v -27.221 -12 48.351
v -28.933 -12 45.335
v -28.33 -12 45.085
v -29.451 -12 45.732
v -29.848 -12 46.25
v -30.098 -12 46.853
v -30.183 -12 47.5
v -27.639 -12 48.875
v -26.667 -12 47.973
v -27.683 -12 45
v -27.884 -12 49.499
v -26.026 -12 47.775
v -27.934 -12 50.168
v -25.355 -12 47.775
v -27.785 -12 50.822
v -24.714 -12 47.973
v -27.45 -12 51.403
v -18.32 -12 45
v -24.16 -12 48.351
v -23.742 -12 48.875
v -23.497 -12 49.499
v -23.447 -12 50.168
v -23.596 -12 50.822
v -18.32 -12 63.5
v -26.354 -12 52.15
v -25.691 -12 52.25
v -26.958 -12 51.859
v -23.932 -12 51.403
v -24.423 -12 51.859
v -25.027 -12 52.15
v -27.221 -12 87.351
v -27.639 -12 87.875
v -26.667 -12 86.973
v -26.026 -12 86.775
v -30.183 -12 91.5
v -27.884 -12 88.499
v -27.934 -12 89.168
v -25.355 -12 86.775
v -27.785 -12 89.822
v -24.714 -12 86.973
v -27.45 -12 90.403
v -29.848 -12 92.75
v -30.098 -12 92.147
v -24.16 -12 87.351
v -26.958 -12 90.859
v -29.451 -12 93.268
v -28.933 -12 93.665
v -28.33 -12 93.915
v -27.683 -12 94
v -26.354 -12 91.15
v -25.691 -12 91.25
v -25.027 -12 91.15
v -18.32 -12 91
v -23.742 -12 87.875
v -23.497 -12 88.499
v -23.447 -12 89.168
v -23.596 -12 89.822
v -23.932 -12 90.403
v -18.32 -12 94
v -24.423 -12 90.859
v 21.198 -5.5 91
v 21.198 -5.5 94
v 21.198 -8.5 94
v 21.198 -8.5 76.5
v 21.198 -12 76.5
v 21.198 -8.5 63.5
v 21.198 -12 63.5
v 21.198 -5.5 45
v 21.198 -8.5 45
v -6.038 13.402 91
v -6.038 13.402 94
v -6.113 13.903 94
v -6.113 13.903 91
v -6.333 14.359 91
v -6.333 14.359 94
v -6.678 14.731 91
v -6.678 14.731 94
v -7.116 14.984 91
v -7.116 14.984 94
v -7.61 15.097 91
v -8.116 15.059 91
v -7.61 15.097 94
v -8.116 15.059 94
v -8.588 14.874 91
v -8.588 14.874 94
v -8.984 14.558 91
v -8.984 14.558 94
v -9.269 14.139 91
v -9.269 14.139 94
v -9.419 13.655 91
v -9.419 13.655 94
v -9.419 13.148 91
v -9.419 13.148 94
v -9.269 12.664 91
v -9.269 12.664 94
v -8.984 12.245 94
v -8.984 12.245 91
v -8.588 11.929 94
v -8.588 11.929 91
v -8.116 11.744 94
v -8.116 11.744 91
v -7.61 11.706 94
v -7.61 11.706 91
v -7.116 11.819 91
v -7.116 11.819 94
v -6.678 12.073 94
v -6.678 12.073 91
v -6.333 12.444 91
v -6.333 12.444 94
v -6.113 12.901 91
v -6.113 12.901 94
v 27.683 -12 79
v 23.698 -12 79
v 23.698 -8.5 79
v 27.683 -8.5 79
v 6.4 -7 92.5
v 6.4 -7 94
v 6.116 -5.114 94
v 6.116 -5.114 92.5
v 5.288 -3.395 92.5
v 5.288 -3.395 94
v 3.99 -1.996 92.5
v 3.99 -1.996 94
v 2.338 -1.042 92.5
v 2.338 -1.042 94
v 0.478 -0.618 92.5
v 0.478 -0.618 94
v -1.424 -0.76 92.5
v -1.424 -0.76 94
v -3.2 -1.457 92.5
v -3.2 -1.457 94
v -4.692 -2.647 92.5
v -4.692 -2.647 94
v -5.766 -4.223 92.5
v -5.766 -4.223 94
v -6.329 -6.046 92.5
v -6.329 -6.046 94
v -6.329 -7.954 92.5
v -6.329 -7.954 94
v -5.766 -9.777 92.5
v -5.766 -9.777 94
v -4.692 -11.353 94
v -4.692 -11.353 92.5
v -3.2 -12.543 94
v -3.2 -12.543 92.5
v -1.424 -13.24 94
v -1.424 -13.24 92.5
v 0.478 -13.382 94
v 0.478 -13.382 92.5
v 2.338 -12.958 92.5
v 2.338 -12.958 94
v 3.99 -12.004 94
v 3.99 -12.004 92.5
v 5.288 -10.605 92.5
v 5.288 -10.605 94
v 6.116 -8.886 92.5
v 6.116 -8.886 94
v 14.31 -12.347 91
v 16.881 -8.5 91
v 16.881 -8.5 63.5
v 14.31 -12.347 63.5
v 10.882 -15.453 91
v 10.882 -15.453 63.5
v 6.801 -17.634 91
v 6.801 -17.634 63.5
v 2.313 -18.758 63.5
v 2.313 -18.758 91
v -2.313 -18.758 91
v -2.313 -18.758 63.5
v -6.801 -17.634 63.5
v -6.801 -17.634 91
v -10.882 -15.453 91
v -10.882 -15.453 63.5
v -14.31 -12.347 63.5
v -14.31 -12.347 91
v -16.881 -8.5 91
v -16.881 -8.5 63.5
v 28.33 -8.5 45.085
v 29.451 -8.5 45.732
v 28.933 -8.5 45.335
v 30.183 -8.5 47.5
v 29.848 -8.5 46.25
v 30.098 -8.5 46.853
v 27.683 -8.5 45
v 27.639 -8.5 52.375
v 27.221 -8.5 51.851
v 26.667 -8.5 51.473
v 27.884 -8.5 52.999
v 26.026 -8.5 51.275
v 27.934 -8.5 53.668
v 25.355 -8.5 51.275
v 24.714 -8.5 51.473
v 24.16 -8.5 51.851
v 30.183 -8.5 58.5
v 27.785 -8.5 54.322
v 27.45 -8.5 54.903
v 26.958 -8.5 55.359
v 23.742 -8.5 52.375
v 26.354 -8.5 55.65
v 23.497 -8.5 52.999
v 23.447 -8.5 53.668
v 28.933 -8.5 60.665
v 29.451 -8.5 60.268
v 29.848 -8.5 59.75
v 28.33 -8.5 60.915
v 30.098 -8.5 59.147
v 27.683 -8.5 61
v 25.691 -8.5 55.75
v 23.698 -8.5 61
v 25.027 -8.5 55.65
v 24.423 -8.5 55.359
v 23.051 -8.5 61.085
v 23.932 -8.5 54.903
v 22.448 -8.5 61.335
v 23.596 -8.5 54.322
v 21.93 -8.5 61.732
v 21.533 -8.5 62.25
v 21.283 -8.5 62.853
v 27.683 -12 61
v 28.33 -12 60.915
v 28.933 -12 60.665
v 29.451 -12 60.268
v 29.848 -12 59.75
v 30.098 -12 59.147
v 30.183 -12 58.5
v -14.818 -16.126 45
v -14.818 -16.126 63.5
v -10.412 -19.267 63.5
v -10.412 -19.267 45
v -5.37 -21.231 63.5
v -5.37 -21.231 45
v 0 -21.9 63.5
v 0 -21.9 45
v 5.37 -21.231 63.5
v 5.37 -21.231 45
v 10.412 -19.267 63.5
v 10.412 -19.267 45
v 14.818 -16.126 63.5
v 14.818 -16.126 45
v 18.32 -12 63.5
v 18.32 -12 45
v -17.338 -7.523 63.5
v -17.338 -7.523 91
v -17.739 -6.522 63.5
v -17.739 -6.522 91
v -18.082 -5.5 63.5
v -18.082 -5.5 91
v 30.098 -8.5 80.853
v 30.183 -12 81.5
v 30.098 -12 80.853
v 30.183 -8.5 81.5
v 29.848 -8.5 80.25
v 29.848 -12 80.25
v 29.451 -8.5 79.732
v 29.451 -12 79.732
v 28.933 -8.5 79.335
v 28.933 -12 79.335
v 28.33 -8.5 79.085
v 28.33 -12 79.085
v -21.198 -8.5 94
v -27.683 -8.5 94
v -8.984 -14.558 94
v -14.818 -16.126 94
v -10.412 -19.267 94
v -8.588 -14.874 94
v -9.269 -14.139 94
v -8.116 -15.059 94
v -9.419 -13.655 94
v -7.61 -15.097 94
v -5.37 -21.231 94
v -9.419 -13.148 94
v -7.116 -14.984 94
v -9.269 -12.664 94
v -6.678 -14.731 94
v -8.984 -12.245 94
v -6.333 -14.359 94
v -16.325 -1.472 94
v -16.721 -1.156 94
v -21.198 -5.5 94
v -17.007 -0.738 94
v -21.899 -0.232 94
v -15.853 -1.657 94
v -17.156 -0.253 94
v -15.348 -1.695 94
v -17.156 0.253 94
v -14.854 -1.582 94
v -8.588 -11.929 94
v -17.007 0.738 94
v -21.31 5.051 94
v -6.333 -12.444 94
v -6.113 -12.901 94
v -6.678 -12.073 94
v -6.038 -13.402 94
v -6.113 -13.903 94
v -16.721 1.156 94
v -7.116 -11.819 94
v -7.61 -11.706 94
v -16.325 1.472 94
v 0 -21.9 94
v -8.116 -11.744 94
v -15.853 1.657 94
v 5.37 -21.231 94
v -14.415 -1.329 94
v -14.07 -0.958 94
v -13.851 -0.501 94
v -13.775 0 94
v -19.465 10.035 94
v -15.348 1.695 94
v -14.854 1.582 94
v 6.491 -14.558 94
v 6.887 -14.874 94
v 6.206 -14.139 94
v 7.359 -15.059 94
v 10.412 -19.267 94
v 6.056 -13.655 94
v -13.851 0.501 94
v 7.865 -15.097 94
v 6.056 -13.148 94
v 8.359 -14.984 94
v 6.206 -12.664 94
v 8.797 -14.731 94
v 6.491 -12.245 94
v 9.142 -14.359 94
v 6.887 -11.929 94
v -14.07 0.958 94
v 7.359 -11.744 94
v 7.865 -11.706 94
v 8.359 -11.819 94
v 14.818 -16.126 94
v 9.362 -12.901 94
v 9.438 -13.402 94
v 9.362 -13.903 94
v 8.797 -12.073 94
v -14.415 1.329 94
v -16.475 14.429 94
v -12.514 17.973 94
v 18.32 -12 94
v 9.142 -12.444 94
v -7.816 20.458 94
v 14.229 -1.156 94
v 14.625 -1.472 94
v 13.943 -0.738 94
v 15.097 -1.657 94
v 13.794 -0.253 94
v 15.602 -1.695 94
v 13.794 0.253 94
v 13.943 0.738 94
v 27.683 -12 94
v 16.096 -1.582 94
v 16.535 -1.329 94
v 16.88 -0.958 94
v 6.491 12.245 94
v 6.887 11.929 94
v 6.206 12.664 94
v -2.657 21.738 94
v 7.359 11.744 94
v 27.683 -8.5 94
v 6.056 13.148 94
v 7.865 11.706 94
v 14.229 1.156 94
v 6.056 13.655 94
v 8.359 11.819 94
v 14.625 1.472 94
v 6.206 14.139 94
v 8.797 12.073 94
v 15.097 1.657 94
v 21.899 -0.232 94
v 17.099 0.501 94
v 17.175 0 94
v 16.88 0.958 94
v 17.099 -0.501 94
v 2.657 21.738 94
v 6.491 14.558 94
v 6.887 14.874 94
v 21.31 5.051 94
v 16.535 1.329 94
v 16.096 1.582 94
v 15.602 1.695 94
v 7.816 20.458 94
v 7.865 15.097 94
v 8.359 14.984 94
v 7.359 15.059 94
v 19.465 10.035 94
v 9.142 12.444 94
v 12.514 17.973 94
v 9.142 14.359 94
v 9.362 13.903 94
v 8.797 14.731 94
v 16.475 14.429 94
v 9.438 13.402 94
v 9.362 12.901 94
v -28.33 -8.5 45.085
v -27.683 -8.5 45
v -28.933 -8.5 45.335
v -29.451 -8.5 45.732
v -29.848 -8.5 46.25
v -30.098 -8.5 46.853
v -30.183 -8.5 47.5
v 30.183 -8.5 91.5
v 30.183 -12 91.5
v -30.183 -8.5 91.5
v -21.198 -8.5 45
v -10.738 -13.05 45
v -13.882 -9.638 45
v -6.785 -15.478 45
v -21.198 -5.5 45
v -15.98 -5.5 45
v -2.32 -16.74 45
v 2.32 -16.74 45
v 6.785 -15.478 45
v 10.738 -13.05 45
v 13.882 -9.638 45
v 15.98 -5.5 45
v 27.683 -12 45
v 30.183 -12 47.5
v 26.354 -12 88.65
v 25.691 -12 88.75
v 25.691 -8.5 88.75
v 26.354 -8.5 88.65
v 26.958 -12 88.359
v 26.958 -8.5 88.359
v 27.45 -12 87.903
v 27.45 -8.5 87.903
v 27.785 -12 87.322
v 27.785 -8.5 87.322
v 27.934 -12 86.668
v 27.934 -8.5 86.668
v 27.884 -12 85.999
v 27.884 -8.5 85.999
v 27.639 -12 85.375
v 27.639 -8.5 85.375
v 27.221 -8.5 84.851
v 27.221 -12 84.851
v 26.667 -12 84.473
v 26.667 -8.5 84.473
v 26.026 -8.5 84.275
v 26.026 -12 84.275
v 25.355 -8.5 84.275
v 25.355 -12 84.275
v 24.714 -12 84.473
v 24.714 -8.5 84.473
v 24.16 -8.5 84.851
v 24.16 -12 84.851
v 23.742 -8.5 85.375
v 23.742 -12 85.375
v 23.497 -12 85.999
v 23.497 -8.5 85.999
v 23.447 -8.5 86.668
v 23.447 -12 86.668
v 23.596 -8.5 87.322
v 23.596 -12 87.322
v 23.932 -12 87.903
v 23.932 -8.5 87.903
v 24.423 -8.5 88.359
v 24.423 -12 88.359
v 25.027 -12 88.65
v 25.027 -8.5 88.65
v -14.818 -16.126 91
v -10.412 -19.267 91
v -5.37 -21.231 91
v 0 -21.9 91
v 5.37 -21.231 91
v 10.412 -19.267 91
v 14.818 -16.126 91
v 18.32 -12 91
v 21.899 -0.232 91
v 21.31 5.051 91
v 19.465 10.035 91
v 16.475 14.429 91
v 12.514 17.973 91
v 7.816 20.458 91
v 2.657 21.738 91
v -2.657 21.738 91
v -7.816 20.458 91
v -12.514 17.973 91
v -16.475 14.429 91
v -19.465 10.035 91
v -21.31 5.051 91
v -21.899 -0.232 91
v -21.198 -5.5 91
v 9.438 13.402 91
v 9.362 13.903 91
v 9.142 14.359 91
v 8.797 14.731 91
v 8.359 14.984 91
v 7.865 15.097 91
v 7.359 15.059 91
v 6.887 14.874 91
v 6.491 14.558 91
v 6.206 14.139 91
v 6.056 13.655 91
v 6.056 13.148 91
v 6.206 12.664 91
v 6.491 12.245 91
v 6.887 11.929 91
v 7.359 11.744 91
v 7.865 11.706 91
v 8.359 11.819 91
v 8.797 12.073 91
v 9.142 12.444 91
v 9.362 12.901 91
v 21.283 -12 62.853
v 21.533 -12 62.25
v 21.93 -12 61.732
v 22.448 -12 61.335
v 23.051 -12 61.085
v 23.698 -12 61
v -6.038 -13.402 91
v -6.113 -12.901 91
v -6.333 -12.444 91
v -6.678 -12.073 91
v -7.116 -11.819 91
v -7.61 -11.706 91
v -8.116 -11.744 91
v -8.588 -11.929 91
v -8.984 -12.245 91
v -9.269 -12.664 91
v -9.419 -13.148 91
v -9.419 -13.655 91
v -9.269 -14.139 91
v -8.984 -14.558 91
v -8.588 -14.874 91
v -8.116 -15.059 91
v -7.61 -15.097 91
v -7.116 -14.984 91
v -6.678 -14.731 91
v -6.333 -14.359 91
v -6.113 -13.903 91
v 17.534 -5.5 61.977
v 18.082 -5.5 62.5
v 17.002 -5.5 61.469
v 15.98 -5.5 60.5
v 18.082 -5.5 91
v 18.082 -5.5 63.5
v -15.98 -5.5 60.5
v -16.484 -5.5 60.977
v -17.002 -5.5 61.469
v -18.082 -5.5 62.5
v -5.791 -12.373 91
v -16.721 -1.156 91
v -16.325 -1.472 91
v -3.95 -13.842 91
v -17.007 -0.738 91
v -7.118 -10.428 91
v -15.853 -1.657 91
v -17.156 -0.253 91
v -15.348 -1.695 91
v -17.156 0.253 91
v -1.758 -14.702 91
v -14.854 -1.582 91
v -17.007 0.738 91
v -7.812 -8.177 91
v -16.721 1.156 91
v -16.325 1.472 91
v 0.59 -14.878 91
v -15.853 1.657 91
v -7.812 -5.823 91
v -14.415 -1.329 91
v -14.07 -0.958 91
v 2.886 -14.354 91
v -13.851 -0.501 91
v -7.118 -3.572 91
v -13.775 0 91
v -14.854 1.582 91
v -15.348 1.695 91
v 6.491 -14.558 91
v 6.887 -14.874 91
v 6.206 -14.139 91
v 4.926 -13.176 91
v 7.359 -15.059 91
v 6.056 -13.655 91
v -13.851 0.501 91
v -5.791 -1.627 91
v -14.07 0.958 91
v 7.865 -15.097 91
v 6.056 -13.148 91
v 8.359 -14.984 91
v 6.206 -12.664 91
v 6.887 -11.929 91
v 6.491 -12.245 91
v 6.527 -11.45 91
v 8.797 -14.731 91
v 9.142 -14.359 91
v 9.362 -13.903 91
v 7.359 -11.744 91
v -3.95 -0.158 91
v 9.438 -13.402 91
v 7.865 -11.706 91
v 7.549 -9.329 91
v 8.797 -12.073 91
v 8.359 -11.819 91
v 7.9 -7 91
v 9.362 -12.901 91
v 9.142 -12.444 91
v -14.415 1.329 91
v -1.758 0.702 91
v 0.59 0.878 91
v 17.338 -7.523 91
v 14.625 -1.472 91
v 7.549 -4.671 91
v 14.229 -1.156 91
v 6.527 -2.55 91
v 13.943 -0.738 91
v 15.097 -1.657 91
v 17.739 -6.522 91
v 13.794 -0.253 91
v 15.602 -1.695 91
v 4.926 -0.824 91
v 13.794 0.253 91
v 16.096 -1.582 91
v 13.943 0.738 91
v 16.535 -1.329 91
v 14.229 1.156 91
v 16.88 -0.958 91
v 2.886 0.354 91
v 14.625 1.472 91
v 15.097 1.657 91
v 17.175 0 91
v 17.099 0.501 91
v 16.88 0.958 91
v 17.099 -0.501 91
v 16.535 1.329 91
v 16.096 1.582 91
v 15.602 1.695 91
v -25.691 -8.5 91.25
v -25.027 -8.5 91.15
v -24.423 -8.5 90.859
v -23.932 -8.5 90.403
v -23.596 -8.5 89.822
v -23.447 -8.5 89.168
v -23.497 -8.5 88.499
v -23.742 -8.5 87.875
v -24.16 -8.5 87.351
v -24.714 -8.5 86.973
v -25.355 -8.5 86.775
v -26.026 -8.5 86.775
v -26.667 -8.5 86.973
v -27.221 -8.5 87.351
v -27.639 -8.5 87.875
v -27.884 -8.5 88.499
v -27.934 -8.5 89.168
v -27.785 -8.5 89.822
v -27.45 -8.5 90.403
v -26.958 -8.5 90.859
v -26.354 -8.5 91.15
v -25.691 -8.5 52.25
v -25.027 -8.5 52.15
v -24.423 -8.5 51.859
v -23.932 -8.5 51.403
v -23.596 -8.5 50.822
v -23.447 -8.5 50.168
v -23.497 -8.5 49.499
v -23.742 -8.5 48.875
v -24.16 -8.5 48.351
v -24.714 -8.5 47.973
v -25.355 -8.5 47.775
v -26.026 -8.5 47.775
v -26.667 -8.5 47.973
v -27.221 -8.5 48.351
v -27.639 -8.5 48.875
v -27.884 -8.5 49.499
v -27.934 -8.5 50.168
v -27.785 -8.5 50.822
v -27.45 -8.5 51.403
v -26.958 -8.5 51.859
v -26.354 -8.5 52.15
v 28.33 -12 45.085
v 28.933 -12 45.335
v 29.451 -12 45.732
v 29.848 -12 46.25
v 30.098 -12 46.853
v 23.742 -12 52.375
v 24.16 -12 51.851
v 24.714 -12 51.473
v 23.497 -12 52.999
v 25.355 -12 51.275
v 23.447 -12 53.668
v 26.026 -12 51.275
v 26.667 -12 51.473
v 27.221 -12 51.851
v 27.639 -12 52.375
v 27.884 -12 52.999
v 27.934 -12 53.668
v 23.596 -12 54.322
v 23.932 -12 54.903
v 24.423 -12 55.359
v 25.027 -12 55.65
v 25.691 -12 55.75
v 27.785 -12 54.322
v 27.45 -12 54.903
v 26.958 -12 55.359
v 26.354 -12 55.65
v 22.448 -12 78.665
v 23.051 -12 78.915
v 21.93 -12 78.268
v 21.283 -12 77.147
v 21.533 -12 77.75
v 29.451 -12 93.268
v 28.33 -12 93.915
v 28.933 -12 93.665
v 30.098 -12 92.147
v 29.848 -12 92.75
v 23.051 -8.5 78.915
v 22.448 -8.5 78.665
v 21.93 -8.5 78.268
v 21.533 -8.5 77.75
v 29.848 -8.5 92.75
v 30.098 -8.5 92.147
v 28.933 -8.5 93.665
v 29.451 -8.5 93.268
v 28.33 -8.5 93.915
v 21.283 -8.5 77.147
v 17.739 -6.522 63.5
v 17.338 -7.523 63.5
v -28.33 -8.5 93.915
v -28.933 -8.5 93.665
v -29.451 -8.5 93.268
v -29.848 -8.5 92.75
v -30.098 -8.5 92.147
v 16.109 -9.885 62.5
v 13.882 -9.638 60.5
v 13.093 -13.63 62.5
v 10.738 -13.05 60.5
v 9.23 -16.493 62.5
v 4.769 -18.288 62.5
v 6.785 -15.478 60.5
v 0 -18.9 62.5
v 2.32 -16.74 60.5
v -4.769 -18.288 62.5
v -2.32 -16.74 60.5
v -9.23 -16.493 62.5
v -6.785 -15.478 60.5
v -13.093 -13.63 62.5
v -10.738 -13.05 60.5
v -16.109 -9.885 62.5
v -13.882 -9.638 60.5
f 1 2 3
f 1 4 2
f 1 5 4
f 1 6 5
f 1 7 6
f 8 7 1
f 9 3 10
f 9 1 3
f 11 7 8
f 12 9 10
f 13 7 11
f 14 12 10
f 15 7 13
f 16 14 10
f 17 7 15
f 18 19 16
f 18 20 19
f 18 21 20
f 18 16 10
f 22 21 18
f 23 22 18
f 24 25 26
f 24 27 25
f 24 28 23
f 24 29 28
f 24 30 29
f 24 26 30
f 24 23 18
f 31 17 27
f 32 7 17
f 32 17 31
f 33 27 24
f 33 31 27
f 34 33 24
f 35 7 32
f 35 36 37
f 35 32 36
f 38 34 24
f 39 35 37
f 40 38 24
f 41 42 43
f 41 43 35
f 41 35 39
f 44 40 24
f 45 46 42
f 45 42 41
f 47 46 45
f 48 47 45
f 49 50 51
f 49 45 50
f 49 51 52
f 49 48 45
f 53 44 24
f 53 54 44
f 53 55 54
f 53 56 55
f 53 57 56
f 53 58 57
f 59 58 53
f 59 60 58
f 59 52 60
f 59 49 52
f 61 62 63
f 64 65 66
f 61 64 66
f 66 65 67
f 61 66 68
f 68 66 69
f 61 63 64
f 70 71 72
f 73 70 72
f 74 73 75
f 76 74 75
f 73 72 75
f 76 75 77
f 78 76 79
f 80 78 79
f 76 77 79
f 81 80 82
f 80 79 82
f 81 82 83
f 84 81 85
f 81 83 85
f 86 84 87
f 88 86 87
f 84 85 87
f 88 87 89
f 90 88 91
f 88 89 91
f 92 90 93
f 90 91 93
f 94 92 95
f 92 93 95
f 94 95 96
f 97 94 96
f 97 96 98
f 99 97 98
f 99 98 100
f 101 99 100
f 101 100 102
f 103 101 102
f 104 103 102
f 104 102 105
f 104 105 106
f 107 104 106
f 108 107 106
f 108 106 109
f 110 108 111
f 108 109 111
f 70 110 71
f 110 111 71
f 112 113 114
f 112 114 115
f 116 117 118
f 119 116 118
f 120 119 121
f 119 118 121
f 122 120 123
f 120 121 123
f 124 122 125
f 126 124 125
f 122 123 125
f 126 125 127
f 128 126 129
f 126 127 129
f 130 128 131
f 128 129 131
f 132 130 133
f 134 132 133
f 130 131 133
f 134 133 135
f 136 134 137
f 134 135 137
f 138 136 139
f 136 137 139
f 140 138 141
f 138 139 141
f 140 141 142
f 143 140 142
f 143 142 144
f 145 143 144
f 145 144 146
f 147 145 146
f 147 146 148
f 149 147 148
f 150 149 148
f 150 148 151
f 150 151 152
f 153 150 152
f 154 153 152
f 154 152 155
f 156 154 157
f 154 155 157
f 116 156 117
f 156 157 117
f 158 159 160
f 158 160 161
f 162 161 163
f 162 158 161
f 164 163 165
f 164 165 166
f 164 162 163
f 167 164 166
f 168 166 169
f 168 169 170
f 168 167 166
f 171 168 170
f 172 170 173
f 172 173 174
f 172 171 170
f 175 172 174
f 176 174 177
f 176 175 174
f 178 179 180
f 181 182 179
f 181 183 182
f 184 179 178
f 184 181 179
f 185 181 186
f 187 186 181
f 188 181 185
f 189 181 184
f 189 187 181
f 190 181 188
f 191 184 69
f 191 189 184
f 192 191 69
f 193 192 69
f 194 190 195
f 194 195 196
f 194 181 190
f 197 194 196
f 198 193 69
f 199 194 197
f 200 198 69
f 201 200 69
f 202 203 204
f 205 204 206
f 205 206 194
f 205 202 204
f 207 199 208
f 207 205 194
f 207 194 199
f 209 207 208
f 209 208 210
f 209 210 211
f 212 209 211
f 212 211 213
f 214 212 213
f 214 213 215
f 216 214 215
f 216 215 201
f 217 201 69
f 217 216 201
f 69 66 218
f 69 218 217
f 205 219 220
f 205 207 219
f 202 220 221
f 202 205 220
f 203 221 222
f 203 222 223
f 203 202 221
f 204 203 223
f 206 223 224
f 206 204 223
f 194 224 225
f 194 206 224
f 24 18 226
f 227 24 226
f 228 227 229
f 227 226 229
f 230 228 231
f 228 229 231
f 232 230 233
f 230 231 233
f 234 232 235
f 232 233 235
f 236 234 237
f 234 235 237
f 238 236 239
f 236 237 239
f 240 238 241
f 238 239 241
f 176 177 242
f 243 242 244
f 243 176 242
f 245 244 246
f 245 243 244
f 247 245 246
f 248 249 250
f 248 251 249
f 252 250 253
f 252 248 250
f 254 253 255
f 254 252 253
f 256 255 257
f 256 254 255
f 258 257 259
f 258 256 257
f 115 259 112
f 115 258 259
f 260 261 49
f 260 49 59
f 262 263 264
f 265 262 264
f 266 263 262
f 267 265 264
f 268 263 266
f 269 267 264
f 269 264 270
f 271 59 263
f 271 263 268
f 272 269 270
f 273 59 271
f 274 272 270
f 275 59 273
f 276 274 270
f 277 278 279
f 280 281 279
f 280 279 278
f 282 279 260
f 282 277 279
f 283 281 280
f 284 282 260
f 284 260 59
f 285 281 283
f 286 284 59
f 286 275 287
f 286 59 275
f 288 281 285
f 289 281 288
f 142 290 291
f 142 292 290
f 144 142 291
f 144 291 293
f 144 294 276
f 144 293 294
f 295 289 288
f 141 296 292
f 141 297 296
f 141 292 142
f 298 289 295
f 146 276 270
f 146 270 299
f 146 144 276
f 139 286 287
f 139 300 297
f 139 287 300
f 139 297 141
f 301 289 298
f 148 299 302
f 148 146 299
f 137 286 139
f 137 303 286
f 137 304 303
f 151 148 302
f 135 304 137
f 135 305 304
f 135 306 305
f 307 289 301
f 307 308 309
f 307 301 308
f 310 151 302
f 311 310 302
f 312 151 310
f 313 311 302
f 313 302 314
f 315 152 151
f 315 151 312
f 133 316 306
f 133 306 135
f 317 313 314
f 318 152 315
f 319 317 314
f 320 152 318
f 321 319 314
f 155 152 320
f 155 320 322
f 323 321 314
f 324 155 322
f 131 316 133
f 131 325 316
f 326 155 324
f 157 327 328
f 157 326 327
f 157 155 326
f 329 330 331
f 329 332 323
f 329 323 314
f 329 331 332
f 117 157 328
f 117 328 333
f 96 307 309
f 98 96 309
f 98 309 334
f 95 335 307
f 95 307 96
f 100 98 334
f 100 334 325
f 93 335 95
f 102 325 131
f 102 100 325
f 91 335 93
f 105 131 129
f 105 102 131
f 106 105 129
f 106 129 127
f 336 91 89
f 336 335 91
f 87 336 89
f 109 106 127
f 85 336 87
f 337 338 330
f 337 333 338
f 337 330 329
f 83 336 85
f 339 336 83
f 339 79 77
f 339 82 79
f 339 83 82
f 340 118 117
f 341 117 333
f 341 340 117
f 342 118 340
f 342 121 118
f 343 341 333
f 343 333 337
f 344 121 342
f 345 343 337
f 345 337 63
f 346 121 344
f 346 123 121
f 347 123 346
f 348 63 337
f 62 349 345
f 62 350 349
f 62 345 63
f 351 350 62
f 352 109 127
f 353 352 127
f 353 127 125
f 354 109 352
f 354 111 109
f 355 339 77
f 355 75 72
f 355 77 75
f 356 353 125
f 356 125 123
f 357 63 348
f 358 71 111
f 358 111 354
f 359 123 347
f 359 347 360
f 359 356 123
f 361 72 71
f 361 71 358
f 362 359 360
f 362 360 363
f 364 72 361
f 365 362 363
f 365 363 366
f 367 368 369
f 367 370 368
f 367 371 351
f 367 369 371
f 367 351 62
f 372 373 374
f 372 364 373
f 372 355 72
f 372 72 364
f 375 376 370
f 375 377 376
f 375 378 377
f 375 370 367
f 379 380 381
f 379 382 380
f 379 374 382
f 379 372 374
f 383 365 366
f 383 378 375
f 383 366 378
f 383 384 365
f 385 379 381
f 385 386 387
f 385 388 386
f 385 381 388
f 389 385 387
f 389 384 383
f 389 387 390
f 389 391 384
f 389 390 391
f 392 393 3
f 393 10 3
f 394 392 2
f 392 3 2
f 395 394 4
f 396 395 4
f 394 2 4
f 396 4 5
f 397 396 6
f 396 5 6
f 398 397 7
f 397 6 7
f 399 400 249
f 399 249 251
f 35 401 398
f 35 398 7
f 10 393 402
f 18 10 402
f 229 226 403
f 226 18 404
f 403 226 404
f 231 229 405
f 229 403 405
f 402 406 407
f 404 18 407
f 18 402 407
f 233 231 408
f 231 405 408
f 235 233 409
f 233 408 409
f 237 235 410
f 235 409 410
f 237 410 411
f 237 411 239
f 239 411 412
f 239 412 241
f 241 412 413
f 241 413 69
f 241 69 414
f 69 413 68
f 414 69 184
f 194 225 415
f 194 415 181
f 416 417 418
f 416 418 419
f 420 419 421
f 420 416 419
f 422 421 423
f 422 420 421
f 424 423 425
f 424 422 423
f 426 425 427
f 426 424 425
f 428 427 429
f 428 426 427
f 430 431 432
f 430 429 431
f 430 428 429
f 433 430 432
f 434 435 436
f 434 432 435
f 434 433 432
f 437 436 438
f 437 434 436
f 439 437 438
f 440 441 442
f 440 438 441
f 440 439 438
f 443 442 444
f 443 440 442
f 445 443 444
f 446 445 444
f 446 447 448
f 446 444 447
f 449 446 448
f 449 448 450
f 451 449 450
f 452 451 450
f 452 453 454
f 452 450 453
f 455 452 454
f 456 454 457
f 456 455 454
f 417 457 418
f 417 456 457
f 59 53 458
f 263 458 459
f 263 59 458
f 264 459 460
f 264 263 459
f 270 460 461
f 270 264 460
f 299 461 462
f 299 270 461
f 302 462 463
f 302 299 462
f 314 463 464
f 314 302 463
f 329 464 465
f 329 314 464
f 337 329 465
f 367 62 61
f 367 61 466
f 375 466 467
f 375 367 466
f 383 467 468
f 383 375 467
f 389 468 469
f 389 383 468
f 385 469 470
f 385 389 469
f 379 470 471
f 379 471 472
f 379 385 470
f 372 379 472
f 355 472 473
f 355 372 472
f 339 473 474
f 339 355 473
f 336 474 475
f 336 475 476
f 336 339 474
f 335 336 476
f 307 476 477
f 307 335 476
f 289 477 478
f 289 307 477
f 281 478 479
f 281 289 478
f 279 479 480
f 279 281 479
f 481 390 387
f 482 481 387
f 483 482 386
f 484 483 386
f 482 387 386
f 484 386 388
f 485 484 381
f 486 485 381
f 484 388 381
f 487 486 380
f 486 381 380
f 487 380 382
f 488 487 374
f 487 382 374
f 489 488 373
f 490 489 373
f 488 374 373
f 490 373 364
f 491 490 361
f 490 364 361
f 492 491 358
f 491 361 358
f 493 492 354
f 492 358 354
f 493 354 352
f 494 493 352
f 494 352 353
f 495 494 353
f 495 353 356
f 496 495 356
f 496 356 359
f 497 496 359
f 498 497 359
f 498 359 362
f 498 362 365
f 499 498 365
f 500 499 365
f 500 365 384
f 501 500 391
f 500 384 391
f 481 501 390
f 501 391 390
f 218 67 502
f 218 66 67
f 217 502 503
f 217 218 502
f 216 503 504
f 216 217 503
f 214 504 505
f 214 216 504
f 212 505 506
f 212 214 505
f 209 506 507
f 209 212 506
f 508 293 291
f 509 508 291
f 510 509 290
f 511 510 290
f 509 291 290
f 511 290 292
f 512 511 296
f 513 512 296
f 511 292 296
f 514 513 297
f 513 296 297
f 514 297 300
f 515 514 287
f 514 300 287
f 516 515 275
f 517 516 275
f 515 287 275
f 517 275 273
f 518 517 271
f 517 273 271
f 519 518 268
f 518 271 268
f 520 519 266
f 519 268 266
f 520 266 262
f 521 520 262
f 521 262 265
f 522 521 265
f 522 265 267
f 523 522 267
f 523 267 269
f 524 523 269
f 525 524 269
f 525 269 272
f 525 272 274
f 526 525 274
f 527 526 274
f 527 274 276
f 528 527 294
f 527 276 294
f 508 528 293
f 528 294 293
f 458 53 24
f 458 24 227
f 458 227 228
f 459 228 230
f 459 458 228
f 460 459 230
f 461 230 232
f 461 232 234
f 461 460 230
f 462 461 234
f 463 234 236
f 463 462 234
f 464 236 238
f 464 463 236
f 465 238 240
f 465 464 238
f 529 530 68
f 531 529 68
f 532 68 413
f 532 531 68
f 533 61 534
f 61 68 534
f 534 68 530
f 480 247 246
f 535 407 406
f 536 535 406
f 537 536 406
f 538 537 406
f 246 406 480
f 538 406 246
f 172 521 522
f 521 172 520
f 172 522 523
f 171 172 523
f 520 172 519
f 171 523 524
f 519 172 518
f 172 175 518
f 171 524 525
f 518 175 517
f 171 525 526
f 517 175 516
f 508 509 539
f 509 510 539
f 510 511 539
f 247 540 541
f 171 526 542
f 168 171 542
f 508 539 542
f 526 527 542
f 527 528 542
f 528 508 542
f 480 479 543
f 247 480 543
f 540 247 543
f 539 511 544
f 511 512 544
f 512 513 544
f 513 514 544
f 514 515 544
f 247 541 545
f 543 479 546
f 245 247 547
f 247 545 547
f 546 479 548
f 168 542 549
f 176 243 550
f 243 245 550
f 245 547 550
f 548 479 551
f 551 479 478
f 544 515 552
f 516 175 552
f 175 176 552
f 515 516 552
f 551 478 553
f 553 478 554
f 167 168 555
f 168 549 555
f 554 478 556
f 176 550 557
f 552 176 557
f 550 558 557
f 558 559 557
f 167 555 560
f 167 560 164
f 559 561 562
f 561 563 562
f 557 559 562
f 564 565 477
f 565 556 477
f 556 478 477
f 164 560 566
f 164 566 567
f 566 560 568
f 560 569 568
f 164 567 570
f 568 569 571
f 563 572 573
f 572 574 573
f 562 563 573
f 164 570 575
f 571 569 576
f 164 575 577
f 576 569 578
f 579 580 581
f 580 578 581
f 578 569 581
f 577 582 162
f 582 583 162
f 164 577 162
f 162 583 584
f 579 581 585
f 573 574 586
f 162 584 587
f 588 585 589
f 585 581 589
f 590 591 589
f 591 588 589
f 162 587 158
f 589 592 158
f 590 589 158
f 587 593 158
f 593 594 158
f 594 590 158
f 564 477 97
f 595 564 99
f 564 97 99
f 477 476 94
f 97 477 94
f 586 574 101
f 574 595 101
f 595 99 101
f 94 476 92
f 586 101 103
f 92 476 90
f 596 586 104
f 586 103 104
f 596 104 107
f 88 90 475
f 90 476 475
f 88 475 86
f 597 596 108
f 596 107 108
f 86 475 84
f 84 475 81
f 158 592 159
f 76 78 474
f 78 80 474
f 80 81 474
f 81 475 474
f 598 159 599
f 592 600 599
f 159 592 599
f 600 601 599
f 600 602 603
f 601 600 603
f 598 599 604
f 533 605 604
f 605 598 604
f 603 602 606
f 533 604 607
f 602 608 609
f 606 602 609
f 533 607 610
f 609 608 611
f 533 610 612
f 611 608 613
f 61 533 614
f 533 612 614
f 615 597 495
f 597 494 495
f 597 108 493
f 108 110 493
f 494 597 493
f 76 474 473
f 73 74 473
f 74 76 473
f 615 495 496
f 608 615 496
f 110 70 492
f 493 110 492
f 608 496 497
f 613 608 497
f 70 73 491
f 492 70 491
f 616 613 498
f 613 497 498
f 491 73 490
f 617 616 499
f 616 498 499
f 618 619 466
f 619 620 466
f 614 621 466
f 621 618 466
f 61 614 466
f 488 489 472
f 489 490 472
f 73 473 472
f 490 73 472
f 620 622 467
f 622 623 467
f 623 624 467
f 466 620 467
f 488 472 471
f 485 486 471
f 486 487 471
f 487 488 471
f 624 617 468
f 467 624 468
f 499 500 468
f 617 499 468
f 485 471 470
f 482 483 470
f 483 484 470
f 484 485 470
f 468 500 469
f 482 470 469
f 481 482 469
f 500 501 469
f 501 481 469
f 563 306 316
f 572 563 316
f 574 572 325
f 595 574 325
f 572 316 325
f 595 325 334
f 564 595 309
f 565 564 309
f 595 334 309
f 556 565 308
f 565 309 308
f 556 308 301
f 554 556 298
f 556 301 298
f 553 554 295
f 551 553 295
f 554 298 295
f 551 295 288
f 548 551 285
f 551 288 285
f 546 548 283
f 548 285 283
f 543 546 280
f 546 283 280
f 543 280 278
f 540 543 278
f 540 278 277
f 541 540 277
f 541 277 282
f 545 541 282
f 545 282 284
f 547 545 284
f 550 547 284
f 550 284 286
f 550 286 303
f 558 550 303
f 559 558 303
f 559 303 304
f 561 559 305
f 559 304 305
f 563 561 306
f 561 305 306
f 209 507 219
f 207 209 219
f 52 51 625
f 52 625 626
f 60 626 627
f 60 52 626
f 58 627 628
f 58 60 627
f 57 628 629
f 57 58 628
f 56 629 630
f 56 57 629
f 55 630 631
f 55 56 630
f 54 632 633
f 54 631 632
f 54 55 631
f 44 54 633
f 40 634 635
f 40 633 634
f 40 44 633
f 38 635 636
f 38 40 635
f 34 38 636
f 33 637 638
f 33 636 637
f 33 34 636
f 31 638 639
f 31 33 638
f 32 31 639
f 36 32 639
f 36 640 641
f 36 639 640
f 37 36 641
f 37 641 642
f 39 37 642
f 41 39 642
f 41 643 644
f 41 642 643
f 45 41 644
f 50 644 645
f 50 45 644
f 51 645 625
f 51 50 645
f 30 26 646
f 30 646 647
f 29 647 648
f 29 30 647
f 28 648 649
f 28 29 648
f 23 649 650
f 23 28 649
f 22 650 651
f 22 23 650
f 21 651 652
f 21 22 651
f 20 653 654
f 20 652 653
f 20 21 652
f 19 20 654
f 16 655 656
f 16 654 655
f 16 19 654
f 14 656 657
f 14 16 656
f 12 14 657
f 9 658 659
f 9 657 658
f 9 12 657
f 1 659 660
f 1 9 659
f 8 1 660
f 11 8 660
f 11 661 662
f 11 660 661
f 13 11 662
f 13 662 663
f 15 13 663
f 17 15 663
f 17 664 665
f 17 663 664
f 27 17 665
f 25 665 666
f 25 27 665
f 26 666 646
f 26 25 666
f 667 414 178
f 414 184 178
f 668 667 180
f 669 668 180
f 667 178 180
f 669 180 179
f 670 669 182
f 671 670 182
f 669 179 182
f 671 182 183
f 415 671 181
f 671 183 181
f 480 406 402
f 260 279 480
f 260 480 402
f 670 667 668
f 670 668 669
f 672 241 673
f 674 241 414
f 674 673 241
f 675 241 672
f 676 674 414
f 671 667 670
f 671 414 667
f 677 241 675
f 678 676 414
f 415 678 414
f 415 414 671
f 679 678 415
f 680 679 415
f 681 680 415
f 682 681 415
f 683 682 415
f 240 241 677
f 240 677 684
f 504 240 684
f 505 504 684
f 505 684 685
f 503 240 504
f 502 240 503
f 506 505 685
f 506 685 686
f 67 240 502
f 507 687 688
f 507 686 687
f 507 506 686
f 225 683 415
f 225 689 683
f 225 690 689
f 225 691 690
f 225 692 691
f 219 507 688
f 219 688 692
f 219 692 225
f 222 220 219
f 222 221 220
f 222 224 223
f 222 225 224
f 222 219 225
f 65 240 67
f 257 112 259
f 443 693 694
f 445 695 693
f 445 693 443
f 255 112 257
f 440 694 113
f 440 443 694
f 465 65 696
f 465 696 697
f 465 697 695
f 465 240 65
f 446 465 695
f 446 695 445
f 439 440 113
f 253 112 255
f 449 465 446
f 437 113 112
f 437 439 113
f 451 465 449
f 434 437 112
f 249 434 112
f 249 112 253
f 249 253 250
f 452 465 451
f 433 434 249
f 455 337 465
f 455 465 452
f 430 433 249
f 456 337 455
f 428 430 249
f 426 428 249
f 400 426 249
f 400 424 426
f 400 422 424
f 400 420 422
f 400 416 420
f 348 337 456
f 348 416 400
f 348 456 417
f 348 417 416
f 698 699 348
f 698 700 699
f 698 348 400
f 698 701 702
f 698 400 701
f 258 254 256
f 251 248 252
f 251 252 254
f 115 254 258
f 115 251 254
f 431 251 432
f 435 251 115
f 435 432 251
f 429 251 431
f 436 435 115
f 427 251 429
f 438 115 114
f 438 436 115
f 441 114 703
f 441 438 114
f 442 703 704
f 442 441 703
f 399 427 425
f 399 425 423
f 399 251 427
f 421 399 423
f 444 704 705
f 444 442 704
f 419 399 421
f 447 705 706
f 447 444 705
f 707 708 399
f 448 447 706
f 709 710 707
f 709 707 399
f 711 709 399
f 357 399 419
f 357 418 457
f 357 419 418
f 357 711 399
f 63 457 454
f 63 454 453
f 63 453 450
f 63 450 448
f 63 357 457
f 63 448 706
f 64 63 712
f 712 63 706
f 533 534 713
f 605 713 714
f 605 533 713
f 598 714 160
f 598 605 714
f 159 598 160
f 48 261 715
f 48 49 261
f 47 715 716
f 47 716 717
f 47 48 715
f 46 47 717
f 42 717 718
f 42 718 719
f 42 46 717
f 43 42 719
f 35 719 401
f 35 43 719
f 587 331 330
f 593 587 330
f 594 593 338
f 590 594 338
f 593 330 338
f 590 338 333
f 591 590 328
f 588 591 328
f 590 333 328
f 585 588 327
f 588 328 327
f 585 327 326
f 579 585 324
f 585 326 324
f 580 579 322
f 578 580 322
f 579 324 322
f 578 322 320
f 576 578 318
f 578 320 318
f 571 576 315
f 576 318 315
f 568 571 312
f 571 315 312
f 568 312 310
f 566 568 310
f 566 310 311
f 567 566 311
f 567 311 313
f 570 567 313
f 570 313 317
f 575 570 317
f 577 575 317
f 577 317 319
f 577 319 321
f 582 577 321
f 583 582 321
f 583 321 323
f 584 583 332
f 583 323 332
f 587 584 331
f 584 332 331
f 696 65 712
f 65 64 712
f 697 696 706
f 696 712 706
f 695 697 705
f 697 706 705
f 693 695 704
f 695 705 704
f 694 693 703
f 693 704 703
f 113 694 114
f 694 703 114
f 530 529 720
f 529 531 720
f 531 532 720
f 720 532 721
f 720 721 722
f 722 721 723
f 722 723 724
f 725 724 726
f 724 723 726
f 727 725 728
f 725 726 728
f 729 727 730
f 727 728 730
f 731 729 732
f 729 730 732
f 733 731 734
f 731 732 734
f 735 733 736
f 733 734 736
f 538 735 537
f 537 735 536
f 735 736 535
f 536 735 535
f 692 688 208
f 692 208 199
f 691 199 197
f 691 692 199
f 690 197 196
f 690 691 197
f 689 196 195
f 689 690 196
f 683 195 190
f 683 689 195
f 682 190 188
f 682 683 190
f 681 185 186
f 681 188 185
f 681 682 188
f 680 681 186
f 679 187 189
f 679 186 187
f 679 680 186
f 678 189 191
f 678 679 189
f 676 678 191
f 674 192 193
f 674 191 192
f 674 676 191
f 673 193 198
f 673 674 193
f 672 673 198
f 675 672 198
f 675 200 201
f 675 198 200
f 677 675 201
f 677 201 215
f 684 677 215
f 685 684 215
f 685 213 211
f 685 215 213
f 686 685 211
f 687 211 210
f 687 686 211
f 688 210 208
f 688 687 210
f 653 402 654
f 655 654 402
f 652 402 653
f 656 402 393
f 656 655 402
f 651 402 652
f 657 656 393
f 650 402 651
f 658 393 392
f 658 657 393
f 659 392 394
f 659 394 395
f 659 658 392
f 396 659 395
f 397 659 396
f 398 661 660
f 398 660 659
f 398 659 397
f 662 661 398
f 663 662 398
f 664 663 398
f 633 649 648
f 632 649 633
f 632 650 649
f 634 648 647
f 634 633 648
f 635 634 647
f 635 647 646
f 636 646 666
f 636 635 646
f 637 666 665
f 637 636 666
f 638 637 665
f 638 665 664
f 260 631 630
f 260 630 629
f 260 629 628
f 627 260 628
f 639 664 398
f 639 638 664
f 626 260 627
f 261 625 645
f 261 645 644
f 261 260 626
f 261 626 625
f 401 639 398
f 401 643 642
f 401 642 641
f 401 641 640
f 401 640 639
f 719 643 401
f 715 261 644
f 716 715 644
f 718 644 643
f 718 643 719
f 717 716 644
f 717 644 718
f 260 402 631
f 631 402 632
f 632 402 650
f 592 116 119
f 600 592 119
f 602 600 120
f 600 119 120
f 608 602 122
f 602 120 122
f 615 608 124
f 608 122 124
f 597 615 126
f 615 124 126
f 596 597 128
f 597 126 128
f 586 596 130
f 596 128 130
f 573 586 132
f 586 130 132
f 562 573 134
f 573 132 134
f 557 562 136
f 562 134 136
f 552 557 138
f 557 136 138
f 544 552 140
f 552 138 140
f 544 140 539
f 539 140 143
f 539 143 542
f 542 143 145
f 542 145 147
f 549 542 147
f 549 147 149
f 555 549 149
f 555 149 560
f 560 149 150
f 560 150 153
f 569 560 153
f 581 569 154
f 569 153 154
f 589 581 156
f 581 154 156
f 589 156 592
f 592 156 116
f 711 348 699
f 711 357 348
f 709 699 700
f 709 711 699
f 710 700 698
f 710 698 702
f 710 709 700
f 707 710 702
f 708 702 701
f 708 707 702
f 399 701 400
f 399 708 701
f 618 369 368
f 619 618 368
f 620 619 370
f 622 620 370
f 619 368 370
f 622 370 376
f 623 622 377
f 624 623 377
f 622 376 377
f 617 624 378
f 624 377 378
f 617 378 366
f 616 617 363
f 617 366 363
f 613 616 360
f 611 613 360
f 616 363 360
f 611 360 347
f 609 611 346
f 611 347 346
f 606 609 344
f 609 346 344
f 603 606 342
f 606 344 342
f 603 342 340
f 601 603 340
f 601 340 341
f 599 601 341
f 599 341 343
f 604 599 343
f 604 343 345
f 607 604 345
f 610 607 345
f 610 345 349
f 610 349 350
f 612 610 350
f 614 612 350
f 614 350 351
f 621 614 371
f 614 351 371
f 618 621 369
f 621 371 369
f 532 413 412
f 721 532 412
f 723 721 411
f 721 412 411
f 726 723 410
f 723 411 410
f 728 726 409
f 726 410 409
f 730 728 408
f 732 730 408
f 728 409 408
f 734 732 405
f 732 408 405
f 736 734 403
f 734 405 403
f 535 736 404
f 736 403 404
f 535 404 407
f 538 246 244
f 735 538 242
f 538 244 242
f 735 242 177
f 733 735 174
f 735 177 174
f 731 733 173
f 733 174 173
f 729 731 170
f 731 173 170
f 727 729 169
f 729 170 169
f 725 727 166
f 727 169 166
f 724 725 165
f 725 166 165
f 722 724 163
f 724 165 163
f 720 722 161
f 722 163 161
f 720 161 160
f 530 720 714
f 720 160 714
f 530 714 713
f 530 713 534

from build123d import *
from build123d.topology import SkipClean

# Parameters (mm, degrees)
BOSS_EXTRUDE1_START     = 94
SKETCH1_R               = 21.9
SKETCH1_R_2             = 1.7
SKETCH1_R_3             = 6.4
BOSS_EXTRUDE1_DEPTH     = 3
BOSS_EXTRUDE2_START     = 91
BOSS_EXTRUDE2_DEPTH     = 27.5
BOSS_EXTRUDE3_START     = 45
BOSS_EXTRUDE3_DEPTH     = 18.5
BOSS_EXTRUDE7_START     = 94
BOSS_EXTRUDE7_DEPTH     = 49
CUT_EXTRUDE5_DEPTH      = 104.301419283
CUT_EXTRUDE5_DEPTH_BACK = 104.301419283
SKETCH4_W               = 8.985048174
SKETCH4_H               = 18
SKETCH4_R               = 2.25
CHAMFER3_SIZE           = 3
CHAMFER4_SIZE           = 1.5
FILLET2_R               = 2.5


with BuildPart() as part:
    # Sketch1 → Boss-Extrude1 (new body)
    with BuildSketch(Plane.XY.offset(BOSS_EXTRUDE1_START)):
        Circle(SKETCH1_R)
        with Locations((15.475, 0)):
            Circle(SKETCH1_R_2, mode=Mode.SUBTRACT)
        with Locations((7.7375, -13.401743124)):
            Circle(SKETCH1_R_2, mode=Mode.SUBTRACT)
        with Locations((-7.7375, -13.401743124)):
            Circle(SKETCH1_R_2, mode=Mode.SUBTRACT)
        with Locations((-15.475, 0)):
            Circle(SKETCH1_R_2, mode=Mode.SUBTRACT)
        with Locations((-7.7375, 13.401743124)):
            Circle(SKETCH1_R_2, mode=Mode.SUBTRACT)
        with Locations((7.7375, 13.401743124)):
            Circle(SKETCH1_R_2, mode=Mode.SUBTRACT)
        with Locations((0, -7)):
            Circle(SKETCH1_R_3, mode=Mode.SUBTRACT)
    extrude(amount=-BOSS_EXTRUDE1_DEPTH)

    # Sketch1<5> → Boss-Extrude2 (add)
    with BuildSketch(Plane.XY.offset(BOSS_EXTRUDE2_START)):
        with BuildLine():
            ThreePointArc((18.319661569, -12), (19.330787418, -10.292262036), (20.183161298, -8.5))
            Line((20.183161298, -8.5), (16.880758277, -8.5))
            ThreePointArc((16.880758277, -8.5), (0, -18.9), (-16.880758277, -8.5))
            Line((-16.880758277, -8.5), (-20.183161298, -8.5))
            ThreePointArc((-20.183161298, -8.5), (-19.330787418, -10.292262036), (-18.319661569, -12))
            ThreePointArc((-18.319661569, -12), (0, -21.9), (18.319661569, -12))
        make_face()
        with BuildLine():
            Line((-20.183161298, -8.5), (-16.880758277, -8.5))
            ThreePointArc((-16.880758277, -8.5), (-17.545632887, -7.025721786), (-18.082035284, -5.5))
            Line((-18.082035284, -5.5), (-21.198113124, -5.5))
            ThreePointArc((-21.198113124, -5.5), (-20.744938375, -7.018371022), (-20.183161298, -8.5))
        make_face()
        with BuildLine():
            Line((16.880758277, -8.5), (20.183161298, -8.5))
            ThreePointArc((20.183161298, -8.5), (20.744938375, -7.018371022), (21.198113124, -5.5))
            Line((21.198113124, -5.5), (18.082035284, -5.5))
            ThreePointArc((18.082035284, -5.5), (17.545632887, -7.025721786), (16.880758277, -8.5))
        make_face()
    extrude(amount=-BOSS_EXTRUDE2_DEPTH)

    # Sketch1<6> → Boss-Extrude3 (add)
    with SkipClean():  # the faces are left unmerged after this step: merging them gives an invalid solid
        with BuildSketch(Plane.XY.offset(BOSS_EXTRUDE3_START)):
            with BuildLine():
                Line((21.198113124, -5.5), (15.979987484, -5.5))
                ThreePointArc((15.979987484, -5.5), (0, -16.9), (-15.979987484, -5.5))
                Line((-15.979987484, -5.5), (-21.198113124, -5.5))
                ThreePointArc((-21.198113124, -5.5), (0, -21.9), (21.198113124, -5.5))
            make_face()
        extrude(amount=BOSS_EXTRUDE3_DEPTH)

    # Sketch1<11> → Boss-Extrude7 (add)
    with SkipClean():  # the faces are left unmerged after this step: merging them gives an invalid solid
        with BuildSketch(Plane.XY.offset(BOSS_EXTRUDE7_START)):
            with BuildLine():
                ThreePointArc((21.198113124, -5.5), (20.024388359, -8.867574124), (18.319661569, -12))
                Line((18.319661569, -12), (30.183161298, -12))
                Line((30.183161298, -12), (30.183161298, -8.5))
                Line((30.183161298, -8.5), (21.198113124, -8.5))
                Line((21.198113124, -8.5), (21.198113124, -5.5))
            make_face()
            with BuildLine():
                Line((-30.183161298, -12), (-18.319661569, -12))
                ThreePointArc((-18.319661569, -12), (-20.024388359, -8.867574124), (-21.198113124, -5.5))
                Line((-21.198113124, -5.5), (-21.198113124, -8.5))
                Line((-21.198113124, -8.5), (-30.183161298, -8.5))
                Line((-30.183161298, -8.5), (-30.183161298, -12))
            make_face()
        extrude(amount=-BOSS_EXTRUDE7_DEPTH)

    # Sketch4 → Cut-Extrude5 (cut, two sides: drawn at the far end of the back side and taken through both)
    with SkipClean():  # the faces are left unmerged after this step: merging them gives an invalid solid
        with BuildSketch(Plane(origin=(0, -8.5, 0), x_dir=(1, 0, 0), z_dir=(0, 1, 0)).offset(-CUT_EXTRUDE5_DEPTH_BACK)):
            with Locations((25.690637211, -70)):
                Rectangle(SKETCH4_W, SKETCH4_H)
            with Locations(Location((-25.690637211, -50, 0), (0, 0, 270))):
                Circle(SKETCH4_R)
            with Locations(Location((-25.690637211, -89, 0), (0, 0, 270))):
                Circle(SKETCH4_R)
            with Locations(Location((25.690637211, -86.5, 0), (0, 0, 270))):
                Circle(SKETCH4_R)
            with Locations(Location((25.690637211, -53.5, 0), (0, 0, 270))):
                Circle(SKETCH4_R)
        extrude(amount=CUT_EXTRUDE5_DEPTH + CUT_EXTRUDE5_DEPTH_BACK, mode=Mode.SUBTRACT)

    # Chamfer3
    # the kernel refuses this chamfer: 3 mm, written as the material it takes off along each edge
    with BuildSketch(Plane(origin=(0, 0, 63.5), x_dir=(0.9921367643584464, 0.1251584627915844, 0), z_dir=(-0.1251584627915844, 0.9921367643584464, 0))) as chamfer3_piece_1_section:
        Polygon((16.9 + CHAMFER3_SIZE, 0), (16.9, CHAMFER3_SIZE), (16.9, 0), align=None)
    chamfer3_piece_1 = revolve(axis=Axis((0, 0, 63.5), (0, 0, -1)), revolution_arc=194.379813793, mode=Mode.PRIVATE)
    chamfer3_piece_1 = chamfer3_piece_1 & Plane(origin=(0, 0, 61.502732277), x_dir=(0.8931618135876879, -0.4497354497354555, 0), z_dir=(0, 0, 1)) * Cylinder(18.9, 80, mode=Mode.PRIVATE)
    add(chamfer3_piece_1, mode=Mode.SUBTRACT)

    # Chamfer4
    chamfer4_edges = [part.edges().sort_by_distance(p)[0] for p in [
        (-6.4, -7, 91),
    ]]
    chamfer(chamfer4_edges, length=CHAMFER4_SIZE)

    # Fillet2
    fillet2_edges = [part.edges().sort_by_distance(p)[0] for p in [
        (21.198113124, -10.25, 79),
        (21.198113124, -10.25, 61),
        (30.183161298, -10.25, 61),
        (30.183161298, -10.25, 79),
        (-30.183161298, -10.25, 45),
        (-30.183161298, -10.25, 94),
        (30.183161298, -10.25, 45),
        (30.183161298, -10.25, 94),
    ]]
    fillet(fillet2_edges, radius=FILLET2_R)


solid = part.part
